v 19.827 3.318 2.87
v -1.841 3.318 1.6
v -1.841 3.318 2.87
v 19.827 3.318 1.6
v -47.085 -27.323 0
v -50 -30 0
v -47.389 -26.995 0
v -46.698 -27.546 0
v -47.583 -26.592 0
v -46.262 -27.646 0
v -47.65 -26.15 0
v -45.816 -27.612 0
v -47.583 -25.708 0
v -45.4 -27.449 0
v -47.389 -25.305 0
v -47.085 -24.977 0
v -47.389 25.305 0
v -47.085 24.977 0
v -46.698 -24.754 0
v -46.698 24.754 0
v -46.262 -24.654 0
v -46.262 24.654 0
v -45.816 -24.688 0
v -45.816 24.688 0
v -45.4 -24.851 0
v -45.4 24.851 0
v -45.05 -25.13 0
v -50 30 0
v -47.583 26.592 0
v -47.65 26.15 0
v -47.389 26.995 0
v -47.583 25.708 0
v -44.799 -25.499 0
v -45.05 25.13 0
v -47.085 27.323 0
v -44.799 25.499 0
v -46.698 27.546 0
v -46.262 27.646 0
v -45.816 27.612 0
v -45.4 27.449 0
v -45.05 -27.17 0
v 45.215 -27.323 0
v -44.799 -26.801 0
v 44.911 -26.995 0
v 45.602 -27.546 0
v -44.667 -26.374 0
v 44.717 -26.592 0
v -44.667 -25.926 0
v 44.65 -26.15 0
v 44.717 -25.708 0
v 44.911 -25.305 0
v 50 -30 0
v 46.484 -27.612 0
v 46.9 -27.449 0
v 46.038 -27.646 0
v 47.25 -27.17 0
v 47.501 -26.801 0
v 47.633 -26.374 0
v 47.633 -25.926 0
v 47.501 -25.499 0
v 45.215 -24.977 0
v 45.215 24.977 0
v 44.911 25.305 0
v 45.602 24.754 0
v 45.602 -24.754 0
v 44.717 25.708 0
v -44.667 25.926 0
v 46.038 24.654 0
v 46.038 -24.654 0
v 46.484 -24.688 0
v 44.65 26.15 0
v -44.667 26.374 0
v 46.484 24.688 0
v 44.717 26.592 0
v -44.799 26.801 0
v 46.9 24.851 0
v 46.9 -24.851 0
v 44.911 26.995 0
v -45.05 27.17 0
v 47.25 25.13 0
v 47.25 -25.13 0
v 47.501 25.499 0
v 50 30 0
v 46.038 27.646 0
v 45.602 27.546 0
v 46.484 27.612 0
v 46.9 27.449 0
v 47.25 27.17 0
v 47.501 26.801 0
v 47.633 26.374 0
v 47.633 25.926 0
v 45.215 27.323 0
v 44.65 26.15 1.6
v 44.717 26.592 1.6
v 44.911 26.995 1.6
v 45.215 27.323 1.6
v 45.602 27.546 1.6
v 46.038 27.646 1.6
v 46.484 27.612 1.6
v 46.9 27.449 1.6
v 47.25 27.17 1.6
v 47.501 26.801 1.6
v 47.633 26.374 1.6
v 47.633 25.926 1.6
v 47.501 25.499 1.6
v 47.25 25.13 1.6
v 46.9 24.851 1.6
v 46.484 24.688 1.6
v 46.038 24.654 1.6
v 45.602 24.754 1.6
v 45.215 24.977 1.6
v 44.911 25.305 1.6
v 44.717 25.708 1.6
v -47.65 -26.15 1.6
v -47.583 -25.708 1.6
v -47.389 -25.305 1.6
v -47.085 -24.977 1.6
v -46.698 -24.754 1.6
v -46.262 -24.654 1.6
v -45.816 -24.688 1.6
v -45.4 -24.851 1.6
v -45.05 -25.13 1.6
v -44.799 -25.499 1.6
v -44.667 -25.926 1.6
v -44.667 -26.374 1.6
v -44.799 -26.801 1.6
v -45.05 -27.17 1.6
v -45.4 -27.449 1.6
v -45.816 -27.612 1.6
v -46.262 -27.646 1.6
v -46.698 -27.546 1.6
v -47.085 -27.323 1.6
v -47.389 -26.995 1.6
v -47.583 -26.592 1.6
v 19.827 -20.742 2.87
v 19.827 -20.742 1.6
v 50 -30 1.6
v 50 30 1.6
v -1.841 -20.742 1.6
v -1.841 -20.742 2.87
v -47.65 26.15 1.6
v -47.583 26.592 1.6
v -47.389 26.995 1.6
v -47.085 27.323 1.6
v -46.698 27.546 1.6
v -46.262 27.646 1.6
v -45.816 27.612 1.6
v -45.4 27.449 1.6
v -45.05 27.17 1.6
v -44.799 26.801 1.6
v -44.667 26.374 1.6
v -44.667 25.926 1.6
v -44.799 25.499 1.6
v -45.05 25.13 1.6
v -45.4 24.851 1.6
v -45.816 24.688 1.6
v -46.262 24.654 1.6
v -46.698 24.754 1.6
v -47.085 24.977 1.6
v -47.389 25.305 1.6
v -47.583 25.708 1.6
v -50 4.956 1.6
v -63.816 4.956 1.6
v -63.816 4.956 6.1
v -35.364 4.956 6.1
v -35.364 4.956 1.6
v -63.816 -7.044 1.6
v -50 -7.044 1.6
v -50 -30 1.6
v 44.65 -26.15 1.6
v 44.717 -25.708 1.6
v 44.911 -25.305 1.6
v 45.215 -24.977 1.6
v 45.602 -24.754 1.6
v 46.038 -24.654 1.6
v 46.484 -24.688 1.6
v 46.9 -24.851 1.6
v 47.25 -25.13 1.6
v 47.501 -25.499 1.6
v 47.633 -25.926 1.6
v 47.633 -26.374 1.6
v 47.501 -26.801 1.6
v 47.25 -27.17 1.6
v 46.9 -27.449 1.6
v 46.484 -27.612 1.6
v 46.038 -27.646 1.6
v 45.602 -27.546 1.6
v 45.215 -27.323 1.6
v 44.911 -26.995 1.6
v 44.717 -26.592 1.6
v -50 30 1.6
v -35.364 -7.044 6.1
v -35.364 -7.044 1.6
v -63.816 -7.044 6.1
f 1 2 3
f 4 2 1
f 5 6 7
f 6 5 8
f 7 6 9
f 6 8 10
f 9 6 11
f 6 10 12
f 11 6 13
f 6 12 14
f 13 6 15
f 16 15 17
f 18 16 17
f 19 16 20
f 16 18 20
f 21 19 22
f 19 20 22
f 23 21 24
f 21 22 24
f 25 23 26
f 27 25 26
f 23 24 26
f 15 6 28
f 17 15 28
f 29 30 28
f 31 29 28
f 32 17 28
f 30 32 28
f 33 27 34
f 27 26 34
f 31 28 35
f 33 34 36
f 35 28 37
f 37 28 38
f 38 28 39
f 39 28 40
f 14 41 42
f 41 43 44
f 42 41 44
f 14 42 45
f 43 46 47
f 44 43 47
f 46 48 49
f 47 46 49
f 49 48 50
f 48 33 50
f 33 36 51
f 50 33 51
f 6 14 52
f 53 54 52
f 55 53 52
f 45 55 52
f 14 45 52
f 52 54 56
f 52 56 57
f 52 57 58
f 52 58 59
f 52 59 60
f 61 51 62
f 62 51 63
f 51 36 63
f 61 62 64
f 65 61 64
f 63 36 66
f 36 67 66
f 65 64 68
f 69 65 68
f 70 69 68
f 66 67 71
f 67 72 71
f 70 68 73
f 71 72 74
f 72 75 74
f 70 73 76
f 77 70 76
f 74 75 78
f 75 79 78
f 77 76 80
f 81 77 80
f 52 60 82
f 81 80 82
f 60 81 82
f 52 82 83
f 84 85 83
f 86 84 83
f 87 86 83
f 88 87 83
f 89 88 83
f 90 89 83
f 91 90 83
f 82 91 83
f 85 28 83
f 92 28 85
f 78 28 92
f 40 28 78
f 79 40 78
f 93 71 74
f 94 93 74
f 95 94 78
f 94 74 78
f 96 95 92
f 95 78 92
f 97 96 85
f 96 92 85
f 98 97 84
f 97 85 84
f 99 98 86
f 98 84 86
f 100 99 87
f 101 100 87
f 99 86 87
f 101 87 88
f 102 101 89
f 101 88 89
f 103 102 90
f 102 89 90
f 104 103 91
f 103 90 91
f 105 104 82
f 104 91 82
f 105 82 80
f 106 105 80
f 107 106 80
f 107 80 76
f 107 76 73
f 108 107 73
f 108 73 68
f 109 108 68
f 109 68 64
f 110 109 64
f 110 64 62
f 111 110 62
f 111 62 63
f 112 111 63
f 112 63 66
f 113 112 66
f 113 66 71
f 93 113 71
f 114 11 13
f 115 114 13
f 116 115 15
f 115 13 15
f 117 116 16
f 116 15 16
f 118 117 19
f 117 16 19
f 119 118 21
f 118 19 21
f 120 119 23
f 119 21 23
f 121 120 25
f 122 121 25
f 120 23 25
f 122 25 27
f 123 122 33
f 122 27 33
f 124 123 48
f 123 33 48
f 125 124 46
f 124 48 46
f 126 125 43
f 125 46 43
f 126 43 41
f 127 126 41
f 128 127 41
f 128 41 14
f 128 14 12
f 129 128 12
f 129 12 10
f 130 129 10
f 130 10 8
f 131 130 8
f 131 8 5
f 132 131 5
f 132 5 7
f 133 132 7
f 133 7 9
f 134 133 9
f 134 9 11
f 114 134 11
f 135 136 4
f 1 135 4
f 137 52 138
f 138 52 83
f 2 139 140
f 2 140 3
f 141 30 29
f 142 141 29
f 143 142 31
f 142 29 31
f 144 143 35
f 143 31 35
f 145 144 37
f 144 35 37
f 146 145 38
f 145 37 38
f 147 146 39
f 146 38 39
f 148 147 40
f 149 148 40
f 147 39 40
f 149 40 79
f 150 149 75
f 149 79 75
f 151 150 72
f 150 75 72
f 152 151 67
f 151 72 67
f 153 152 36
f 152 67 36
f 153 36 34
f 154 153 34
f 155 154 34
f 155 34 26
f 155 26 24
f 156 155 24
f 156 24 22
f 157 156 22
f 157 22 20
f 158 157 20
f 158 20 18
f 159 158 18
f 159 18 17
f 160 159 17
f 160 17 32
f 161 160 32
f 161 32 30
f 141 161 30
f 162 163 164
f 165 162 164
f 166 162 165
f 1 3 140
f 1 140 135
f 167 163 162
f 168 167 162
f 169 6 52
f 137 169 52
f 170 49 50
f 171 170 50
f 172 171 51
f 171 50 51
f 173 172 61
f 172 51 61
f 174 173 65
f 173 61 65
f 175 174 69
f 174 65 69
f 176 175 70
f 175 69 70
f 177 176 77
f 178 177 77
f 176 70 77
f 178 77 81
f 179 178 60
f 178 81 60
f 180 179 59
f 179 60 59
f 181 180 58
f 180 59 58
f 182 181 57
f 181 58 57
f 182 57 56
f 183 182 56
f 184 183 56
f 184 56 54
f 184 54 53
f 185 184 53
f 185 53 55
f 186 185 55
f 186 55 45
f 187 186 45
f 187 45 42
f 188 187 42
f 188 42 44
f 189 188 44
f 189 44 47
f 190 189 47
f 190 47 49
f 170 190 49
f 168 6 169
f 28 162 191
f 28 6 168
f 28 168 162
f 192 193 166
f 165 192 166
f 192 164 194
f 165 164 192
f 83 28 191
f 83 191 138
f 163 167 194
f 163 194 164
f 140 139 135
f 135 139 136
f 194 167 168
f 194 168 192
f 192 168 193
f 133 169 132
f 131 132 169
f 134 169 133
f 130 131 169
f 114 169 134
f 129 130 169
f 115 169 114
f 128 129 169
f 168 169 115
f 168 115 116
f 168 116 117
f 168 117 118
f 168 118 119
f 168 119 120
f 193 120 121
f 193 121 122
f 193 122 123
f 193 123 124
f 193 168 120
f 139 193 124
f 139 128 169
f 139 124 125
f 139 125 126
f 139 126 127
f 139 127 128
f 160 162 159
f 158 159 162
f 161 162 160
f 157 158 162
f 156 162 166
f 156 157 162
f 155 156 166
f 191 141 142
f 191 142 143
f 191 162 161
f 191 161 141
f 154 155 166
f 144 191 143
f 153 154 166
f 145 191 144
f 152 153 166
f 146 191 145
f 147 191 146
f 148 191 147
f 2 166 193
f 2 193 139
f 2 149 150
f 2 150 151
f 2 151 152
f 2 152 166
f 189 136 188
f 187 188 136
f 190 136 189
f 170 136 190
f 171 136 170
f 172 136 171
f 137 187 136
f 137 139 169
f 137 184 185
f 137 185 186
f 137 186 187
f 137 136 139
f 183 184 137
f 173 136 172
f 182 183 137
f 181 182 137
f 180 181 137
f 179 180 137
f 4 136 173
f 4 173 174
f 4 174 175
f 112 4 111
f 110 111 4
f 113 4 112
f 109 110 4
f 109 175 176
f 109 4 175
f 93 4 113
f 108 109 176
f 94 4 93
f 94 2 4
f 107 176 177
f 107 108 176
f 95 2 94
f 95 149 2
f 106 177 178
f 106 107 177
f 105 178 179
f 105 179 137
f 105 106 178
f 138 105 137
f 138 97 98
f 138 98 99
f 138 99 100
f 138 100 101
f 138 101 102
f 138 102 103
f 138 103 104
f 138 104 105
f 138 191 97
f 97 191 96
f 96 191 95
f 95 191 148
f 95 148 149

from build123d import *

# Parameters (mm, degrees)
SKETCH1_W                    = 100
SKETCH1_H                    = 60
BOSS_EXTRUDE1_DEPTH          = 1.6
SKETCH2_W                    = 28.451906957
SKETCH2_H                    = 12
BOSS_EXTRUDE2_DEPTH          = 4.5
SKETCH3_W                    = 21.668043294
SKETCH3_H                    = 24.059695689
BOSS_EXTRUDE3_DEPTH          = 1.27
F_3_0_3_DIAMETER_HOLE1_D     = 3
F_3_0_3_DIAMETER_HOLE1_DEPTH = 3.1496
F_3_0_3_DIAMETER_HOLE1_TIP   = 0.901290929


with BuildPart() as part:
    # Sketch1 → Boss-Extrude1 (new body)
    with BuildSketch(Plane.XY):
        Rectangle(SKETCH1_W, SKETCH1_H)
    extrude(amount=BOSS_EXTRUDE1_DEPTH)

    # Sketch2 → Boss-Extrude2 (add)
    with BuildSketch(Plane.XY.offset(1.6)):
        with Locations((-49.589851522, -1.044)):
            Rectangle(SKETCH2_W, SKETCH2_H)
    extrude(amount=BOSS_EXTRUDE2_DEPTH)

    # Sketch3 → Boss-Extrude3 (add)
    with BuildSketch(Plane.XY.offset(1.6)):
        with Locations((8.993071996, -8.71181328)):
            Rectangle(SKETCH3_W, SKETCH3_H)
    extrude(amount=BOSS_EXTRUDE3_DEPTH)

    # Ø3.0 (3) Diameter Hole1
    with Locations(Plane.XY.offset(1.6)):
        with Locations((-46.15, -26.15), (-46.15, 26.15), (46.15, -26.15), (46.15, 26.15)):
            Hole(F_3_0_3_DIAMETER_HOLE1_D / 2, depth=F_3_0_3_DIAMETER_HOLE1_DEPTH)
            with Locations((0, 0, -(F_3_0_3_DIAMETER_HOLE1_DEPTH + F_3_0_3_DIAMETER_HOLE1_TIP / 2))):  # 118° drill point
                Cone(0, F_3_0_3_DIAMETER_HOLE1_D / 2, F_3_0_3_DIAMETER_HOLE1_TIP, mode=Mode.SUBTRACT)


solid = part.part
